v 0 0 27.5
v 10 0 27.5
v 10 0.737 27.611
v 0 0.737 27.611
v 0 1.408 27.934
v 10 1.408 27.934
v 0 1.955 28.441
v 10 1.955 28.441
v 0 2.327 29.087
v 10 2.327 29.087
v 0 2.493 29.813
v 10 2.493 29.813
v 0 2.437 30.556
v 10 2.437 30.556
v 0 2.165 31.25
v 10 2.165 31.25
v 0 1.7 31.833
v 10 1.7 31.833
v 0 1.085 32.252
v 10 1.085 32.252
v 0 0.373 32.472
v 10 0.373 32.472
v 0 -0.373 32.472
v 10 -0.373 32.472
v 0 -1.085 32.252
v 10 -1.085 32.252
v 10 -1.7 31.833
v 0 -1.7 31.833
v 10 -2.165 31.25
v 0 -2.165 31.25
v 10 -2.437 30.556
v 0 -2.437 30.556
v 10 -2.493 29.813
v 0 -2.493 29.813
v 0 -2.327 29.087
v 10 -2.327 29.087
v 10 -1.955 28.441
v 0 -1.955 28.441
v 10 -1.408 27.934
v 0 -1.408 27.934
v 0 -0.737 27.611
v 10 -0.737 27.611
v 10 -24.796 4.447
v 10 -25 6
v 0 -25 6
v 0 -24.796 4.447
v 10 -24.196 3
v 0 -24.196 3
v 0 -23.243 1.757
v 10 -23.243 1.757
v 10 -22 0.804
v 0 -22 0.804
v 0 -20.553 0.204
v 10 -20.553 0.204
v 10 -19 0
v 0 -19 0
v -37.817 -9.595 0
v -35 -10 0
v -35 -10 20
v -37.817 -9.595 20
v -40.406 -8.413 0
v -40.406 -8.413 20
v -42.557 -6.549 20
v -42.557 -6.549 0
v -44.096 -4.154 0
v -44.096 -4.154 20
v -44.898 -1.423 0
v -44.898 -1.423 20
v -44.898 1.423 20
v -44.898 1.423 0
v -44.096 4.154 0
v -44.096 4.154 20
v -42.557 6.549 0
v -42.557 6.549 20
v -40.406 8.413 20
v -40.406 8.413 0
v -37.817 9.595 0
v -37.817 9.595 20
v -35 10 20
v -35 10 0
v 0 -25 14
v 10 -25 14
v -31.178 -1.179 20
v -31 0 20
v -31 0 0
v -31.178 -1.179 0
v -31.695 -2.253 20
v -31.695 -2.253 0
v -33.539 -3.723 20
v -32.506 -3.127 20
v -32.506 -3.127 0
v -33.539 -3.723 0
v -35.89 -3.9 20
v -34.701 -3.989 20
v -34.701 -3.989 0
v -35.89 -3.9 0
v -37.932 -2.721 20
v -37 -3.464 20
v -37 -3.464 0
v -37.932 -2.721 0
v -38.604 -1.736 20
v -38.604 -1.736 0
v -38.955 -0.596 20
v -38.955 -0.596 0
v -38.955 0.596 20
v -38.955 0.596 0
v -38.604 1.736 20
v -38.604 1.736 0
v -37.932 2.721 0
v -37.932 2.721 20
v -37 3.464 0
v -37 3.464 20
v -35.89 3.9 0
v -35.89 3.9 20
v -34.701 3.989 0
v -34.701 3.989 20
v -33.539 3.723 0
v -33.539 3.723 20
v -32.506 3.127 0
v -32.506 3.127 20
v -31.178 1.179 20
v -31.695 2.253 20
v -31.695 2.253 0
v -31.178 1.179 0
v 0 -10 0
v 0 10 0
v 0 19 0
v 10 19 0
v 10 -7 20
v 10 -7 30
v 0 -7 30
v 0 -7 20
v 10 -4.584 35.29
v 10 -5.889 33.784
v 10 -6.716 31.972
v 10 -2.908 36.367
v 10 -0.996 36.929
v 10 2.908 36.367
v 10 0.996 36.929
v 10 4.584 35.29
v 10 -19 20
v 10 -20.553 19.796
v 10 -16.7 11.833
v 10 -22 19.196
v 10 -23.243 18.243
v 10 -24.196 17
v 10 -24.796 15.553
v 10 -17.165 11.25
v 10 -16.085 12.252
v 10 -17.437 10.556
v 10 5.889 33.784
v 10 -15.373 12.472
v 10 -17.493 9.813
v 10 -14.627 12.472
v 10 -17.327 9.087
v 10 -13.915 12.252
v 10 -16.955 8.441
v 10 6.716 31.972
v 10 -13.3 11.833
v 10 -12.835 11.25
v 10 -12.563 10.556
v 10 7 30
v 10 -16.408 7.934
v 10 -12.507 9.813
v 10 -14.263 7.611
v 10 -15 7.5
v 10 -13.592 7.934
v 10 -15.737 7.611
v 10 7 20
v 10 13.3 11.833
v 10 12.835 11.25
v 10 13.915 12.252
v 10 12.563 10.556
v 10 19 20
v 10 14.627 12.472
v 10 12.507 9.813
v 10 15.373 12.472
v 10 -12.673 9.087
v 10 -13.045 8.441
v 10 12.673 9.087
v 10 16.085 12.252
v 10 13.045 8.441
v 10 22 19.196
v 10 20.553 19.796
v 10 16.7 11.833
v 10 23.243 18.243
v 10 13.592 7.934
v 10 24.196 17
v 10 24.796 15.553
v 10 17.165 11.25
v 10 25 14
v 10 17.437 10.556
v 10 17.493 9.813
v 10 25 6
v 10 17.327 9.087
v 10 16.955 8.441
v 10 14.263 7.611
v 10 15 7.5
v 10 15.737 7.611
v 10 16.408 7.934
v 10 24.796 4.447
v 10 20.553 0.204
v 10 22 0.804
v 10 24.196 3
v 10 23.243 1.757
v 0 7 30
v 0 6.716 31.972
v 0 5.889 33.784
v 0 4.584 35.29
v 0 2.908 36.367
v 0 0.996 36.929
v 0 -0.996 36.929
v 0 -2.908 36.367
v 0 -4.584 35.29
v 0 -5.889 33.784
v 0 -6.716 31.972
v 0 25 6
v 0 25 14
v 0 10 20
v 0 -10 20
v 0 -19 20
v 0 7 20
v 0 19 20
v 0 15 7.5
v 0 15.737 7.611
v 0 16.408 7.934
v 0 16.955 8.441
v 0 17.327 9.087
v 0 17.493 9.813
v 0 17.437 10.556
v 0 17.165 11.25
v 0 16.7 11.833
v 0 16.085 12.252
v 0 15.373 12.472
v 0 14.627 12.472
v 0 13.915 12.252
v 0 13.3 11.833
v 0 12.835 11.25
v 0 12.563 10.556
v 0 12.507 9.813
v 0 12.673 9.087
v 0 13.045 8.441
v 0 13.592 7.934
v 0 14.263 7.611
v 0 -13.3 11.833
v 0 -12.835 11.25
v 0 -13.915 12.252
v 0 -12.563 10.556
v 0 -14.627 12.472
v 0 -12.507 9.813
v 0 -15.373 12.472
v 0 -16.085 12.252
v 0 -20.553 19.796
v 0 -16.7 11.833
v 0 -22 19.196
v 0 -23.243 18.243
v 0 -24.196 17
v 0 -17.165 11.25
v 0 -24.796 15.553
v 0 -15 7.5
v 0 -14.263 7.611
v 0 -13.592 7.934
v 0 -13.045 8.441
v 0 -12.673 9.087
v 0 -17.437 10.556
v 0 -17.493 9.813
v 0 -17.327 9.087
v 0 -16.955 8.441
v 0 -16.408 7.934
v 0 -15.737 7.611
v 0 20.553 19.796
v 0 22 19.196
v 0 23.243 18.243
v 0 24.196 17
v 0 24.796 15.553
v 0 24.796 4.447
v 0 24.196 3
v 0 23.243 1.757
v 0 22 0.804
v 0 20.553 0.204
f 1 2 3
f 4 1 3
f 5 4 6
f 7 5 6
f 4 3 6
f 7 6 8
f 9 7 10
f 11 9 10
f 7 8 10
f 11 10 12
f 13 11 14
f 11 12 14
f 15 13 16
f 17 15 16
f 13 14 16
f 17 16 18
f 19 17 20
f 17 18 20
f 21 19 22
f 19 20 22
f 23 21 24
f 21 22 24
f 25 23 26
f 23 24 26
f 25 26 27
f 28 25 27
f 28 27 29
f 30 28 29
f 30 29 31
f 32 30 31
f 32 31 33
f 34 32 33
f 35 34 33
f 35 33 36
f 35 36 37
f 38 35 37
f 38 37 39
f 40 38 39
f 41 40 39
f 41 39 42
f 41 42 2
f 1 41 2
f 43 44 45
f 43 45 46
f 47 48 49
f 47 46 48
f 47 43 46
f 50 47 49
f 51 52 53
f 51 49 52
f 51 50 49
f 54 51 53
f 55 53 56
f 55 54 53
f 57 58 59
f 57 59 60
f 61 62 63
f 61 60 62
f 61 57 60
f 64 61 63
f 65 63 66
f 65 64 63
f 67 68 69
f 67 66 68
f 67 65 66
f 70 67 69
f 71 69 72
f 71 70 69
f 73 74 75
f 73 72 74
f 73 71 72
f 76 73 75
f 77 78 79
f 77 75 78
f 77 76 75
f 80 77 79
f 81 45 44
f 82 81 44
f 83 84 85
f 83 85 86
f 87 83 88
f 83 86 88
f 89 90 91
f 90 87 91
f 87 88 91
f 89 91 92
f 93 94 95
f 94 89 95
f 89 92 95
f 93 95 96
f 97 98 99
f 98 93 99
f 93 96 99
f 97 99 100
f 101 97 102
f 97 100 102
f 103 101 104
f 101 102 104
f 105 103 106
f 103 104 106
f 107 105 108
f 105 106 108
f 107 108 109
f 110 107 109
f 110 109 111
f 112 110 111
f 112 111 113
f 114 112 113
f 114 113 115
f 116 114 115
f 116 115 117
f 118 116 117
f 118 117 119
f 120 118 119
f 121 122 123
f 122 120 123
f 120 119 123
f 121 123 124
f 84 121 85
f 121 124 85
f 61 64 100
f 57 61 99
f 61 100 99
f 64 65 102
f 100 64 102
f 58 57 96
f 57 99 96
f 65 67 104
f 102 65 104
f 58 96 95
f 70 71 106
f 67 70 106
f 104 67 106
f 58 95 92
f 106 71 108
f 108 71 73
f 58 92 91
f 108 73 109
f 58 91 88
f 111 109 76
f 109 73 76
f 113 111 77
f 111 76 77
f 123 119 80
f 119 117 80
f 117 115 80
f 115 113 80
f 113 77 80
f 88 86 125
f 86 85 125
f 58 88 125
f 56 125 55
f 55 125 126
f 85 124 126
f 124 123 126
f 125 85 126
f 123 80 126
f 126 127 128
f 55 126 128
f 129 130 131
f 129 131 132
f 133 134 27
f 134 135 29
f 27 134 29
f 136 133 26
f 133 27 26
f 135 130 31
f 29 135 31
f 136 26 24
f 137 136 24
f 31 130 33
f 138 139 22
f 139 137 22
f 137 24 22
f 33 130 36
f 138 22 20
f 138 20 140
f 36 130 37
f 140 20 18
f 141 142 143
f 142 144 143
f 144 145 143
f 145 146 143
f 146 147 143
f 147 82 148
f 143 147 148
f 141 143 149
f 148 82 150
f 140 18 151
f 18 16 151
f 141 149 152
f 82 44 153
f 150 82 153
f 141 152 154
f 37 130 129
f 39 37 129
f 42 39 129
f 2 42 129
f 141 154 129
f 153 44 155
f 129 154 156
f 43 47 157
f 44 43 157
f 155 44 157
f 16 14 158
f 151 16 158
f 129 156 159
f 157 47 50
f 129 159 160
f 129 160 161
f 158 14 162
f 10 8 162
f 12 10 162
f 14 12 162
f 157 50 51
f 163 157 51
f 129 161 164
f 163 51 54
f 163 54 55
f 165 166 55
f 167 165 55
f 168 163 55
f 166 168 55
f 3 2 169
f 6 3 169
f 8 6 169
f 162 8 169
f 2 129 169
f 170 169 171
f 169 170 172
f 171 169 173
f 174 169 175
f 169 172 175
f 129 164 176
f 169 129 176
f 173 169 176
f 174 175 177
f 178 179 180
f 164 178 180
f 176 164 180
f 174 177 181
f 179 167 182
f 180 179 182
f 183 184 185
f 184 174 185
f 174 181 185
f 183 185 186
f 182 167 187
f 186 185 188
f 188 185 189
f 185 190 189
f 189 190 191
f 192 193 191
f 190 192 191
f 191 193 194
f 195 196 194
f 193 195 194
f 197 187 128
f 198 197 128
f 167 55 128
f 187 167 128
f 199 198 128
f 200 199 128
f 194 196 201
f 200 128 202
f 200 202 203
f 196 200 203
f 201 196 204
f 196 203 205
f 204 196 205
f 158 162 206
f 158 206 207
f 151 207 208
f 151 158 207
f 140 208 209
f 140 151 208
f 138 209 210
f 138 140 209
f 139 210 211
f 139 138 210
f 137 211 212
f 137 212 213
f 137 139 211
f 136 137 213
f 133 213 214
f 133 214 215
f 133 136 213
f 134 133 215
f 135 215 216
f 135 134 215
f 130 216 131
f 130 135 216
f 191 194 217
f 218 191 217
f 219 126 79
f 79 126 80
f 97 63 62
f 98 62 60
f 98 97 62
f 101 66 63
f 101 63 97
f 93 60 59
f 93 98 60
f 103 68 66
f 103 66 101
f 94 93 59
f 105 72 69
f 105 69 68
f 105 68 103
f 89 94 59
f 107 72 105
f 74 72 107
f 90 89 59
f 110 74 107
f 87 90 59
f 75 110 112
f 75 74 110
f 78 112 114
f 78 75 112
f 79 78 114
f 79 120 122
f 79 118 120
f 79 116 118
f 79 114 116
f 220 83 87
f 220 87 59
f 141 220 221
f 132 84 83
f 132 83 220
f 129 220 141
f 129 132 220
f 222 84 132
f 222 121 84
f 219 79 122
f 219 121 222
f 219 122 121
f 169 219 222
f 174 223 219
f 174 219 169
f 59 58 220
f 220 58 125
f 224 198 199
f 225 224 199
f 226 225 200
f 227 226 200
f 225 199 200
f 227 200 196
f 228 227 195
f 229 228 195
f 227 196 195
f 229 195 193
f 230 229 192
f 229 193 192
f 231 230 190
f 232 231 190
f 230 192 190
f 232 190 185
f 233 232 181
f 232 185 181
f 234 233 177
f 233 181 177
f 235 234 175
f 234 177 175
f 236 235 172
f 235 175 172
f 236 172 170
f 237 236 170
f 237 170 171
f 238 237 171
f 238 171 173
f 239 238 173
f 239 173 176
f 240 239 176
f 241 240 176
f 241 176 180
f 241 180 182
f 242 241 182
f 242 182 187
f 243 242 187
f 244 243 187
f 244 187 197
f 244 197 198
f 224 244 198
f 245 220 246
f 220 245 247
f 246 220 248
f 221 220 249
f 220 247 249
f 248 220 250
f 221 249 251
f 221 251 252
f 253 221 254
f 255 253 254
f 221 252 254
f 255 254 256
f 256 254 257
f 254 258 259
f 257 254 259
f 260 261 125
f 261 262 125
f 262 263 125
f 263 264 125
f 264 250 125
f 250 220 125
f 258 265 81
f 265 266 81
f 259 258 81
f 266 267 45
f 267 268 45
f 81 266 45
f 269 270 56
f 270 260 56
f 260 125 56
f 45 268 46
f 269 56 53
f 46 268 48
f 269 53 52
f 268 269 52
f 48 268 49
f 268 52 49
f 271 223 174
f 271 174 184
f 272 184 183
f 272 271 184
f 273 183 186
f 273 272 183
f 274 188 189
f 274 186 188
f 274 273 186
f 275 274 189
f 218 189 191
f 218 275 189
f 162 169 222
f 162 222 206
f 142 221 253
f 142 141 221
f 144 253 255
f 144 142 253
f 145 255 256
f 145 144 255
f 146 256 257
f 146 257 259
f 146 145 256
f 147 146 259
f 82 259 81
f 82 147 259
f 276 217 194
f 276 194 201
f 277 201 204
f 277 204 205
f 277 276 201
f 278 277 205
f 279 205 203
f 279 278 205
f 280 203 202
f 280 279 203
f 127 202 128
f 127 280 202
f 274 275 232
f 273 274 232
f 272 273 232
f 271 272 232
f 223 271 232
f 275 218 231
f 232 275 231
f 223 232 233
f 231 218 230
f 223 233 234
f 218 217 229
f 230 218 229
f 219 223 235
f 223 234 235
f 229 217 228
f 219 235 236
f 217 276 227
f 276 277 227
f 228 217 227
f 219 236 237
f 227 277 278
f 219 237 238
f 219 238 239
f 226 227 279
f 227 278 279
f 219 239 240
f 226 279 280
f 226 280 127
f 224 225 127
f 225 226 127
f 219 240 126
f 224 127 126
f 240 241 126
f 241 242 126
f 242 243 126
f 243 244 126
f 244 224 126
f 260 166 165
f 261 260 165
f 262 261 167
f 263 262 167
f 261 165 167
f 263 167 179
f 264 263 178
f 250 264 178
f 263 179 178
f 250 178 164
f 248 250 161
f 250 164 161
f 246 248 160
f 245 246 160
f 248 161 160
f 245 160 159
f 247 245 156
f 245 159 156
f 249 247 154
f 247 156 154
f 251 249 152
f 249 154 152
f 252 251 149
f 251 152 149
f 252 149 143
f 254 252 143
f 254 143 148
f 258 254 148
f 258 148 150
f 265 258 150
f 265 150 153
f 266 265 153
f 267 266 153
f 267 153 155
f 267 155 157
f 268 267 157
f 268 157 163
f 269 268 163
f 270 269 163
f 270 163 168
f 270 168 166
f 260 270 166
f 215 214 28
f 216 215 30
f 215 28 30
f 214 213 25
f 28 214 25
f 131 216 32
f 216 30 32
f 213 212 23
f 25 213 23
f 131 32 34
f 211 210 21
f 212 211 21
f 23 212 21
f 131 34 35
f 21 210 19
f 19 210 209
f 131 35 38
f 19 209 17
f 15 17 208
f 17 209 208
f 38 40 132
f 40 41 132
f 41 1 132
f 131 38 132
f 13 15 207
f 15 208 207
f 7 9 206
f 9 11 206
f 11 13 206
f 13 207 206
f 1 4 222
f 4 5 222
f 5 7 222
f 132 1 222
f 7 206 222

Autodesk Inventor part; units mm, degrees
ref_plane "YZ Plane" through (0, 0, 0) normal (1, 0, 0) x (0, 1, 0)
ref_plane "XZ Plane" through (0, 0, 0) normal (0, 1, 0) x (-1, 0, 0)
ref_plane "XY Plane" through (0, 0, 0) normal (0, 0, 1) x (1, 0, 0)
sketch "Sketch1" plane through (0, 0, 0) normal (0, 0, 1) x (1, 0, 0)
  line L0 (0, 0) -> (-35, 0) construction
  circle A0 centre (-35, 0) radius 4
  line L1 (10, 25) -> (0, 25)
  line L2 (0, 25) -> (0, -25)
  line L3 (0, -25) -> (10, -25)
  line L4 (10, -25) -> (10, 25)
  line L5 (0, 0) -> (-35, 0) construction
  line L6 (0, 10) -> (-35, 10)
  line L7 (-35, -10) -> (0, -10)
  arc A1 (0, -10) -> (0, 10) centre (0, 0) ccw
  arc A2 (-35, 10) -> (-35, -10) centre (-35, 0) ccw
  point P0 (-17.5, 0)
  dimension "d0" = 8
  dimension "d1" = 35
  dimension "d2" = 50
  dimension "d3" = 10
  dimension "d4" = 10
extrude "Extrusion1" add sketch "Sketch1" along normal blind 20
sketch "Sketch2" plane through (10, -25, 0) normal (1, 0, 0) x (0, 0, -1)
  line L0 (0, 50) -> (-20, 50) construction
  line L1 (-10, 50) -> (-10, 40) construction
  line L2 (0, 0) -> (-20, 0) construction
  line L3 (-10, 0) -> (-10, 10) construction
  circle A0 centre (-10, 40) radius 2.5
  circle A1 centre (-10, 10) radius 2.5
  point P0 (0, 25)
  dimension "d7" = 5
  dimension "d8" = 10
extrude "Extrusion2" cut sketch "Sketch2" against normal through all
fillet "Fillet1" radius 6 4 edges at (5, 25, 20) (5, 25, 0) (5, -25, 20) (5, -25, 0)
sketch "Sketch3" plane through (10, -19, 0) normal (1, 0, 0) x (0, 0, -1)
  line L0 (-20, 15) -> (-20, 23) projected
  line L1 (-20, 19) -> (-30, 19) construction
  line L2 (-20, 26) -> (-30, 26)
  line L3 (-30, 12) -> (-20, 12)
  arc A0 (-20, 12) -> (-20, 26) centre (-20, 19) ccw
  arc A1 (-30, 26) -> (-30, 12) centre (-30, 19) ccw
  circle A2 centre (-30, 19) radius 2.5
  point P0 (0, 19)
  point P1 (-25, 19)
  dimension "d12" = 5
  dimension "d13" = 7
  dimension "d14" = 10
extrude "Extrusion3" add sketch "Sketch3" against normal blind 10
properties part number "frame mount 2"
